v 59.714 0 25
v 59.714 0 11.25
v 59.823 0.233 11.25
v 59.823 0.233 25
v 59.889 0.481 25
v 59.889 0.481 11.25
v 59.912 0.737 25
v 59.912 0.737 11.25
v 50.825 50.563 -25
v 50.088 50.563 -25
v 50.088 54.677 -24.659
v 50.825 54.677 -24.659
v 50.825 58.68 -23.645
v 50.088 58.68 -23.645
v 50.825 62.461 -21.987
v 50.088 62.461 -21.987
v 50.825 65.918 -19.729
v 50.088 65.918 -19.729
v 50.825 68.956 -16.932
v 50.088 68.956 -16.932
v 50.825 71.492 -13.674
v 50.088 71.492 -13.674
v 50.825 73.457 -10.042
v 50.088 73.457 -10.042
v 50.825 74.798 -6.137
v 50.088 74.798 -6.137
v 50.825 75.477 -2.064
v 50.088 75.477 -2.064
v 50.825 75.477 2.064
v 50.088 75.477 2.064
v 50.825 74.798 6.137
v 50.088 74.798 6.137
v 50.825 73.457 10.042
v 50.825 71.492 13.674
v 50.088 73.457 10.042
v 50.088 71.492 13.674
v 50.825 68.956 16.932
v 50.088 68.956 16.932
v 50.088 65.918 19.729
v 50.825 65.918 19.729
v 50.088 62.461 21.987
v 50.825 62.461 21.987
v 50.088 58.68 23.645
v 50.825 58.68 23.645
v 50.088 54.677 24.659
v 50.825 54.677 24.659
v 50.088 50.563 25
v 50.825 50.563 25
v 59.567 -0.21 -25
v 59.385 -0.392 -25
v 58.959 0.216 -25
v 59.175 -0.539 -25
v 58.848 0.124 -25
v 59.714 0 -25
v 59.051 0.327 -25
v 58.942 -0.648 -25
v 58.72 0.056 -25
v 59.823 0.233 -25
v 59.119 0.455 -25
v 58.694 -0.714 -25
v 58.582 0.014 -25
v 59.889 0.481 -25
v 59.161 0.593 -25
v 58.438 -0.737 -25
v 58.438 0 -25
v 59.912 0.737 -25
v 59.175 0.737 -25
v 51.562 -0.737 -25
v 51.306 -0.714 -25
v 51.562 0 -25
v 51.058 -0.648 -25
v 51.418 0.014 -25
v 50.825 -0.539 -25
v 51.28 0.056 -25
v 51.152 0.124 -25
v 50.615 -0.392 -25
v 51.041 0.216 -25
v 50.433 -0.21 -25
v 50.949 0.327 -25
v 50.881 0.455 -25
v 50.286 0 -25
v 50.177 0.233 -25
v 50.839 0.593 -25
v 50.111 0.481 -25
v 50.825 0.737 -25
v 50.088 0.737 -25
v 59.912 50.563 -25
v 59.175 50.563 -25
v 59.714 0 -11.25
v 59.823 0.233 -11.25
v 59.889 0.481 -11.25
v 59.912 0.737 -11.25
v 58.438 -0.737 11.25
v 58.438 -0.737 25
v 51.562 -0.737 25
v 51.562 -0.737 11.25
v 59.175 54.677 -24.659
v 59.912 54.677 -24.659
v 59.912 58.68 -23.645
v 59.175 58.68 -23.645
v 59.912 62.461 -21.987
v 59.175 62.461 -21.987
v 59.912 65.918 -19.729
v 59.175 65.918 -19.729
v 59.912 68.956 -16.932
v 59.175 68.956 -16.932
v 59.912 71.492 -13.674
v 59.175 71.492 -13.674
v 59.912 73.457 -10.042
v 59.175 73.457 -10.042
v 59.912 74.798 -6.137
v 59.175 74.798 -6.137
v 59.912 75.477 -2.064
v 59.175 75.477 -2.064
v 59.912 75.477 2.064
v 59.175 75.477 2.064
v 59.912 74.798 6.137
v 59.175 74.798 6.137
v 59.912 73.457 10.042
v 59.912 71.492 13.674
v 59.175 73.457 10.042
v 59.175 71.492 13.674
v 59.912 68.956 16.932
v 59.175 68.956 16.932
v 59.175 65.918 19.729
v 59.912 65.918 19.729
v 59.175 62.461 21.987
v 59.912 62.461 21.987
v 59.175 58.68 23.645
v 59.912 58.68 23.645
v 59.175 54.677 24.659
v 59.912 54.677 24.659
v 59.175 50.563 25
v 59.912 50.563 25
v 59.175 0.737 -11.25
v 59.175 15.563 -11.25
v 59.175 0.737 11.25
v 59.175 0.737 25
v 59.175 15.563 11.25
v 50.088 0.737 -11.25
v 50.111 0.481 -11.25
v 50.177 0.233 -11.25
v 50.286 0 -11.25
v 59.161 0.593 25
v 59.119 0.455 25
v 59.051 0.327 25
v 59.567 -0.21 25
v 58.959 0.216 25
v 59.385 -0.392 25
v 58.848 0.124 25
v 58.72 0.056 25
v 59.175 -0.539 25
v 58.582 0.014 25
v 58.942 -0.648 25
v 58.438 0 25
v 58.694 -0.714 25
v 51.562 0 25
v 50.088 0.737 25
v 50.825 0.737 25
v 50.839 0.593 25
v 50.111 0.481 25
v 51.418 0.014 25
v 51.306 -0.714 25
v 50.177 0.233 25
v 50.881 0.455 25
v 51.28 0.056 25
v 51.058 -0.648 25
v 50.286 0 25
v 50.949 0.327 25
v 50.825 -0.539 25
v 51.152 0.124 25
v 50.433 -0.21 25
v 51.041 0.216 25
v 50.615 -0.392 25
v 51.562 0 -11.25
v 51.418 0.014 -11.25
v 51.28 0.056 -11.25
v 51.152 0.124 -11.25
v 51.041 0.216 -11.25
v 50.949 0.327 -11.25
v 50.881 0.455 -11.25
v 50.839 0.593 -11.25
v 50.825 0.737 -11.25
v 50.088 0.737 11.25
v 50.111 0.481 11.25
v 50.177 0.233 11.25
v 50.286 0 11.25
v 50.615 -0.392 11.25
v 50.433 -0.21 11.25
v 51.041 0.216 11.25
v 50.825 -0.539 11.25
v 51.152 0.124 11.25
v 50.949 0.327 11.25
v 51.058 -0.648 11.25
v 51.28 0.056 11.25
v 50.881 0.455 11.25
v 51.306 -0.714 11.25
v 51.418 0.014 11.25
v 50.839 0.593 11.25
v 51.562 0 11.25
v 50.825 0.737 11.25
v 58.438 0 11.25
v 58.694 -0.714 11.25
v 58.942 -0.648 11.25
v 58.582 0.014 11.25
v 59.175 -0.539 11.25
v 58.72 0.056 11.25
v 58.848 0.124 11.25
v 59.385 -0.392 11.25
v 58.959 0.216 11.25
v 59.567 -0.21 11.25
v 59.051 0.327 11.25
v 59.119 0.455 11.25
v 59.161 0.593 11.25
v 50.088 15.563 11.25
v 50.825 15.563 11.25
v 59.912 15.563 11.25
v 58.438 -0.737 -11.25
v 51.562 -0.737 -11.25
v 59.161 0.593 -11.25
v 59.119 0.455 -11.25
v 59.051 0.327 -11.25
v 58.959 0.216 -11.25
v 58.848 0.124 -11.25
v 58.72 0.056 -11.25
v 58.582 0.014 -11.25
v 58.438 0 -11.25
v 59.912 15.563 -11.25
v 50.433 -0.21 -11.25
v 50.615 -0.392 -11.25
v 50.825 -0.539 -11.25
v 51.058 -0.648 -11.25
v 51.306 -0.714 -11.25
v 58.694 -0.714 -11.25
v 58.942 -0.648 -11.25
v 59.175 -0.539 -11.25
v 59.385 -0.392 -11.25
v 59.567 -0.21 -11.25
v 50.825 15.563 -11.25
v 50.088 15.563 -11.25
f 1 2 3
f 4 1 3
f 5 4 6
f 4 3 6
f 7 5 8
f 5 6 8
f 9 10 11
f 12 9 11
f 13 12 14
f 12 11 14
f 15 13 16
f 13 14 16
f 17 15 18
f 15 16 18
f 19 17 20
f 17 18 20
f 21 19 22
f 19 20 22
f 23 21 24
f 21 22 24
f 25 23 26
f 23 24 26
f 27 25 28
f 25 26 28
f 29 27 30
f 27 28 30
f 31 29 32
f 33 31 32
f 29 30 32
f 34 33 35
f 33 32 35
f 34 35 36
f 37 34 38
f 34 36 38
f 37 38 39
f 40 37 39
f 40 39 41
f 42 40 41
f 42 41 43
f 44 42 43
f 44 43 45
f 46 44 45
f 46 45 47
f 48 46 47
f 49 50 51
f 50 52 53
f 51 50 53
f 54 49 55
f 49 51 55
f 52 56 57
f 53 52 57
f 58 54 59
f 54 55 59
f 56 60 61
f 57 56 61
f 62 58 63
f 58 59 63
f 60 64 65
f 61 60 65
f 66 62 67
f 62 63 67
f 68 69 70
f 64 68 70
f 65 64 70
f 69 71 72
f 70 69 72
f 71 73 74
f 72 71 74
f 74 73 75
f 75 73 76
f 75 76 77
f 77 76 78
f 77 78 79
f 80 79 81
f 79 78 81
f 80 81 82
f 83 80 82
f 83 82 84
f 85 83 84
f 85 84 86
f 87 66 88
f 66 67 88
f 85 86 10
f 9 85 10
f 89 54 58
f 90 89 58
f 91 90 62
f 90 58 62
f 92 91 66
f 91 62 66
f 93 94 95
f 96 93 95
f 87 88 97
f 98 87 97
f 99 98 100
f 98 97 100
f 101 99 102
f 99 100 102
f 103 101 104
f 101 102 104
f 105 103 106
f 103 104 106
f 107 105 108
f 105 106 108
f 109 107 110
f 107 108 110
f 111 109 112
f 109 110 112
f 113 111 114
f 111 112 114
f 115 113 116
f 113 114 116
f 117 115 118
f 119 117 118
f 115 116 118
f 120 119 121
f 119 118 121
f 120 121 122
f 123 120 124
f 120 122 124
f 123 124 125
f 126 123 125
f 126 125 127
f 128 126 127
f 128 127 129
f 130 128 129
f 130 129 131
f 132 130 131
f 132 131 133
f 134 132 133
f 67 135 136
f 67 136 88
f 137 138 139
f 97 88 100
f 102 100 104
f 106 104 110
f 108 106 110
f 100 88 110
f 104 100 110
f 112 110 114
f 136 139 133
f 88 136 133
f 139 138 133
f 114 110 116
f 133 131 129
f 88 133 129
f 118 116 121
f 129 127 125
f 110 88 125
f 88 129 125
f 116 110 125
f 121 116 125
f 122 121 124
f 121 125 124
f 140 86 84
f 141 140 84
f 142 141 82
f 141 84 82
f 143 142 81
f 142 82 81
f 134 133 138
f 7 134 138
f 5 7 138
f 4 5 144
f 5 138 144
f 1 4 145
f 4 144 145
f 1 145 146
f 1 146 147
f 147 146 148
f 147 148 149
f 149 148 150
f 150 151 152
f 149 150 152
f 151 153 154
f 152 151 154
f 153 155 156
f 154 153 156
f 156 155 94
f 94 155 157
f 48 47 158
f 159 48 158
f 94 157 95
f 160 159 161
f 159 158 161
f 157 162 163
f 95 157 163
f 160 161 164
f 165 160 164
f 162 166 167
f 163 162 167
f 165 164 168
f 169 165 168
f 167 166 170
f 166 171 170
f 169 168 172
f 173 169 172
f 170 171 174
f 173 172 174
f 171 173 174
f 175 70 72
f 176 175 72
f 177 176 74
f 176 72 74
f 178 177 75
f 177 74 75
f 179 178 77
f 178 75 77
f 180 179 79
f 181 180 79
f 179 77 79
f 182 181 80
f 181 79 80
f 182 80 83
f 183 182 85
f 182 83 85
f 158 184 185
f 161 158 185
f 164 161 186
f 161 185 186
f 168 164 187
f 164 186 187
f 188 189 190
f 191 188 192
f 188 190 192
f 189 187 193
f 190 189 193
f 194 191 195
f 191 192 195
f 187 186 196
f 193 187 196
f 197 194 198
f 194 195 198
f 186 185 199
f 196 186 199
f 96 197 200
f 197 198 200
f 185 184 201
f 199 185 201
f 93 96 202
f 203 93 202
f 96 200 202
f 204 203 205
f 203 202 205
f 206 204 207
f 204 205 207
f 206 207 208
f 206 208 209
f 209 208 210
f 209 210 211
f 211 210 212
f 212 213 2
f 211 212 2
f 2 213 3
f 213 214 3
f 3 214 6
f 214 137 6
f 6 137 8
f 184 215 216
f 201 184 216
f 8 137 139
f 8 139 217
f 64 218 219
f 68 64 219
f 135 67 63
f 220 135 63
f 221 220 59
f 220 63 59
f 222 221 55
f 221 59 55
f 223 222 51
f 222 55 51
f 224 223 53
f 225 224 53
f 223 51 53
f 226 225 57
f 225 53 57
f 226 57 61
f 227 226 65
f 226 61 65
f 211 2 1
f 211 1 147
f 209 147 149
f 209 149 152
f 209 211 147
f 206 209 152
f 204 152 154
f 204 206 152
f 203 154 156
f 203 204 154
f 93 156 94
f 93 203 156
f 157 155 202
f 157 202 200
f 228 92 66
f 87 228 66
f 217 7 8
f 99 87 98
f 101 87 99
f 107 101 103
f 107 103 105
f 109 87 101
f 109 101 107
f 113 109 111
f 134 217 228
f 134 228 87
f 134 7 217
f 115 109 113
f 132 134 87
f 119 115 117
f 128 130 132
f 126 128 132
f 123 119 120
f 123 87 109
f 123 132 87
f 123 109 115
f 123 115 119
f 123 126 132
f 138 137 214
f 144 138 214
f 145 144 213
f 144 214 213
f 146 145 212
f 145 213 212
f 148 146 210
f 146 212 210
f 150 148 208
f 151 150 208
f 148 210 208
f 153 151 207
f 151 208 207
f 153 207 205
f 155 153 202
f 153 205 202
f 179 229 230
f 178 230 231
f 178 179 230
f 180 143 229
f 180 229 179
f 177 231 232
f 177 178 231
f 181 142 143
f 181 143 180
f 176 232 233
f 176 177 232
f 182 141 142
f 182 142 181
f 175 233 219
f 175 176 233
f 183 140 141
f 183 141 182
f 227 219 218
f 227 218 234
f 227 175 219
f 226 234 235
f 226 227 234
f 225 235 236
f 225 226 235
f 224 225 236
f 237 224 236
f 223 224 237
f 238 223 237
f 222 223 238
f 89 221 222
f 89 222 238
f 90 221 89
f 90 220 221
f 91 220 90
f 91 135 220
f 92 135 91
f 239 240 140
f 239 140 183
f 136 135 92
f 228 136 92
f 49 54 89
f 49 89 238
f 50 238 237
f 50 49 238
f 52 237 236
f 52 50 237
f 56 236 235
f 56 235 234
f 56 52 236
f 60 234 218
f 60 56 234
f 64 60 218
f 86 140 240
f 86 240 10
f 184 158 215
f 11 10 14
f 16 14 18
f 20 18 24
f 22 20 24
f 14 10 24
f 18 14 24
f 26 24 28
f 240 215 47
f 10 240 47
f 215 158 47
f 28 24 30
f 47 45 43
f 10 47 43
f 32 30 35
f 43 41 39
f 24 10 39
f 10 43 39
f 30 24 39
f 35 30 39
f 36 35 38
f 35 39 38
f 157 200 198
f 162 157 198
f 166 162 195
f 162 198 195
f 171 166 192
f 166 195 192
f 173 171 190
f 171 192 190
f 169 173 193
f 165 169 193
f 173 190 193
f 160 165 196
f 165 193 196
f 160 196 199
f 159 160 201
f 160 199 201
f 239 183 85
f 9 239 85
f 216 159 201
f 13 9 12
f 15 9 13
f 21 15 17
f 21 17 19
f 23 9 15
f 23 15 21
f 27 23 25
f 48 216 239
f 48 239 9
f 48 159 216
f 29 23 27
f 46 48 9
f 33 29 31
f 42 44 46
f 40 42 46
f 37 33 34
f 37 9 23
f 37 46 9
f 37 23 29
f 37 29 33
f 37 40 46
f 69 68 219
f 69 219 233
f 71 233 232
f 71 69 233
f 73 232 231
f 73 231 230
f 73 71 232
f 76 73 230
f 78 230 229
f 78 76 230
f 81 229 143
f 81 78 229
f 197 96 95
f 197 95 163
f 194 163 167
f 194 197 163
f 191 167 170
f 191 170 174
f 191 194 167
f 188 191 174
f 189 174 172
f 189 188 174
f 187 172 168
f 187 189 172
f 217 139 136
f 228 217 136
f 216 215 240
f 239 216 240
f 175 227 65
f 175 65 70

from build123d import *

# Parameters (mm, degrees)
SKETCH2_W                  = 40
SKETCH2_H                  = 22.5
BASE_FLANGE1_DEPTH         = 0.7366
SKETCHED_START             = -25
SKETCHED_BEND1_DEPTH       = 50
SKETCHED_BEND1_2_DEPTH     = 13.75
SKETCHED_START_2           = 11.25
SKETCHED_BEND1_3_DEPTH     = 13.75
SKETCHED_START_3           = -26
SKETCHED_BEND1_4_OUTLINE_W = 0.7366
SKETCHED_BEND1_4_OUTLINE_H = 50
SKETCHED_BEND1_4_DEPTH     = 61
SKETCHED_START_4           = 75
SKETCHED_BEND1_5_OUTLINE_W = 0.7366
SKETCHED_BEND1_5_OUTLINE_H = 50
SKETCHED_BEND1_5_DEPTH     = 61
SKETCHED_START_5           = 50.0884
SKETCHED_BEND1_6_DEPTH     = 0.7366
SKETCHED_START_6           = 59.175
SKETCHED_BEND1_7_DEPTH     = 0.7366


with BuildPart() as part:
    # Base-Flange1: sheet metal written as solids
    # Sketch2 → Base-Flange1 (new body)
    with BuildSketch(Plane(origin=(0, 0, 0), x_dir=(1, 0, 0), z_dir=(0, 1, 0))):
        with BuildLine():
            Line((0, 25), (110, 25))
            ThreePointArc((110, 25), (135, 0), (110, -25))
            Line((110, -25), (0, -25))
            ThreePointArc((0, -25), (-25, 0), (0, 25))
        make_face()
        with Locations((55, 0)):
            Rectangle(SKETCH2_W, SKETCH2_H, mode=Mode.SUBTRACT)
    extrude(amount=-BASE_FLANGE1_DEPTH)

    # Sketched Bend1: read off the stored shape, not the designer's step
    # Sketched Bend1 outline → Sketched Bend1 (cut)
    with BuildSketch(Plane.XY.offset(SKETCHED_START)):
        with BuildLine():
            Line((35, -0.7366), (51.5616, -0.7366))
            ThreePointArc((51.5616, -0.7366), (50.825, -0.539228625), (50.285771375, 0))
            Line((50.285771375, 0), (35, 0))
            Line((35, 0), (35, -0.7366))
        make_face()
        with BuildLine():
            ThreePointArc((59.714228625, 0), (59.175, -0.539228625), (58.4384, -0.7366))
            Line((58.4384, -0.7366), (75, -0.7366))
            Line((75, -0.7366), (75, 0))
            Line((75, 0), (59.714228625, 0))
        make_face()
    extrude(amount=SKETCHED_BEND1_DEPTH, mode=Mode.SUBTRACT)

    # Sketched Bend1 2 outline → Sketched Bend1 2 (add)
    with BuildSketch(Plane.XY.offset(SKETCHED_START)):
        with BuildLine():
            ThreePointArc((50.0884, 0.7366), (50.138598073, 0.355307783), (50.285771375, 0))
            Line((50.285771375, 0), (51.5616, 0))
            ThreePointArc((51.5616, 0), (51.040745145, 0.215745145), (50.825, 0.7366))
            Line((50.825, 0.7366), (50.825, 15.562627139))
            Line((50.825, 15.562627139), (50.0884, 15.562627139))
            Line((50.0884, 15.562627139), (50.0884, 0.7366))
        make_face()
        with BuildLine():
            Line((58.4384, 0), (59.714228625, 0))
            ThreePointArc((59.714228625, 0), (59.861401927, 0.355307783), (59.9116, 0.7366))
            Line((59.9116, 0.7366), (59.9116, 15.562627139))
            Line((59.9116, 15.562627139), (59.175, 15.562627139))
            Line((59.175, 15.562627139), (59.175, 0.7366))
            ThreePointArc((59.175, 0.7366), (58.959254855, 0.215745145), (58.4384, 0))
        make_face()
    extrude(amount=SKETCHED_BEND1_2_DEPTH)

    # Sketched Bend1 3 outline → Sketched Bend1 3 (add)
    with BuildSketch(Plane.XY.offset(SKETCHED_START_2)):
        with BuildLine():
            ThreePointArc((50.0884, 0.7366), (50.138598073, 0.355307783), (50.285771375, 0))
            Line((50.285771375, 0), (51.5616, 0))
            ThreePointArc((51.5616, 0), (51.040745145, 0.215745145), (50.825, 0.7366))
            Line((50.825, 0.7366), (50.825, 15.562627139))
            Line((50.825, 15.562627139), (50.0884, 15.562627139))
            Line((50.0884, 15.562627139), (50.0884, 0.7366))
        make_face()
        with BuildLine():
            Line((58.4384, 0), (59.714228625, 0))
            ThreePointArc((59.714228625, 0), (59.861401927, 0.355307783), (59.9116, 0.7366))
            Line((59.9116, 0.7366), (59.9116, 15.562627139))
            Line((59.9116, 15.562627139), (59.175, 15.562627139))
            Line((59.175, 15.562627139), (59.175, 0.7366))
            ThreePointArc((59.175, 0.7366), (58.959254855, 0.215745145), (58.4384, 0))
        make_face()
    extrude(amount=SKETCHED_BEND1_3_DEPTH)

    # Sketched Bend1 4 outline → Sketched Bend1 4 (cut)
    with BuildSketch(Plane.YZ.offset(SKETCHED_START_3)):
        with Locations((-0.3683, 0)):
            Rectangle(SKETCHED_BEND1_4_OUTLINE_W, SKETCHED_BEND1_4_OUTLINE_H)
    extrude(amount=SKETCHED_BEND1_4_DEPTH, mode=Mode.SUBTRACT)

    # Sketched Bend1 5 outline → Sketched Bend1 5 (cut)
    with BuildSketch(Plane.YZ.offset(SKETCHED_START_4)):
        with Locations((-0.3683, 0)):
            Rectangle(SKETCHED_BEND1_5_OUTLINE_W, SKETCHED_BEND1_5_OUTLINE_H)
    extrude(amount=SKETCHED_BEND1_5_DEPTH, mode=Mode.SUBTRACT)

    # Sketched Bend1 6 outline → Sketched Bend1 6 (add)
    with BuildSketch(Plane.YZ.offset(SKETCHED_START_5)):
        with BuildLine():
            ThreePointArc((50.562627139, -25), (75.562627139, 0), (50.562627139, 25))
            Line((50.562627139, 25), (15.562627139, 25))
            Line((15.562627139, 25), (15.562627139, -25))
            Line((15.562627139, -25), (50.562627139, -25))
        make_face()
    extrude(amount=SKETCHED_BEND1_6_DEPTH)

    # Sketched Bend1 7 outline → Sketched Bend1 7 (add)
    with BuildSketch(Plane.YZ.offset(SKETCHED_START_6)):
        with BuildLine():
            ThreePointArc((50.562627139, -25), (75.562627139, 0), (50.562627139, 25))
            Line((50.562627139, 25), (15.562627139, 25))
            Line((15.562627139, 25), (15.562627139, -25))
            Line((15.562627139, -25), (50.562627139, -25))
        make_face()
    extrude(amount=SKETCHED_BEND1_7_DEPTH)


solid = part.part
